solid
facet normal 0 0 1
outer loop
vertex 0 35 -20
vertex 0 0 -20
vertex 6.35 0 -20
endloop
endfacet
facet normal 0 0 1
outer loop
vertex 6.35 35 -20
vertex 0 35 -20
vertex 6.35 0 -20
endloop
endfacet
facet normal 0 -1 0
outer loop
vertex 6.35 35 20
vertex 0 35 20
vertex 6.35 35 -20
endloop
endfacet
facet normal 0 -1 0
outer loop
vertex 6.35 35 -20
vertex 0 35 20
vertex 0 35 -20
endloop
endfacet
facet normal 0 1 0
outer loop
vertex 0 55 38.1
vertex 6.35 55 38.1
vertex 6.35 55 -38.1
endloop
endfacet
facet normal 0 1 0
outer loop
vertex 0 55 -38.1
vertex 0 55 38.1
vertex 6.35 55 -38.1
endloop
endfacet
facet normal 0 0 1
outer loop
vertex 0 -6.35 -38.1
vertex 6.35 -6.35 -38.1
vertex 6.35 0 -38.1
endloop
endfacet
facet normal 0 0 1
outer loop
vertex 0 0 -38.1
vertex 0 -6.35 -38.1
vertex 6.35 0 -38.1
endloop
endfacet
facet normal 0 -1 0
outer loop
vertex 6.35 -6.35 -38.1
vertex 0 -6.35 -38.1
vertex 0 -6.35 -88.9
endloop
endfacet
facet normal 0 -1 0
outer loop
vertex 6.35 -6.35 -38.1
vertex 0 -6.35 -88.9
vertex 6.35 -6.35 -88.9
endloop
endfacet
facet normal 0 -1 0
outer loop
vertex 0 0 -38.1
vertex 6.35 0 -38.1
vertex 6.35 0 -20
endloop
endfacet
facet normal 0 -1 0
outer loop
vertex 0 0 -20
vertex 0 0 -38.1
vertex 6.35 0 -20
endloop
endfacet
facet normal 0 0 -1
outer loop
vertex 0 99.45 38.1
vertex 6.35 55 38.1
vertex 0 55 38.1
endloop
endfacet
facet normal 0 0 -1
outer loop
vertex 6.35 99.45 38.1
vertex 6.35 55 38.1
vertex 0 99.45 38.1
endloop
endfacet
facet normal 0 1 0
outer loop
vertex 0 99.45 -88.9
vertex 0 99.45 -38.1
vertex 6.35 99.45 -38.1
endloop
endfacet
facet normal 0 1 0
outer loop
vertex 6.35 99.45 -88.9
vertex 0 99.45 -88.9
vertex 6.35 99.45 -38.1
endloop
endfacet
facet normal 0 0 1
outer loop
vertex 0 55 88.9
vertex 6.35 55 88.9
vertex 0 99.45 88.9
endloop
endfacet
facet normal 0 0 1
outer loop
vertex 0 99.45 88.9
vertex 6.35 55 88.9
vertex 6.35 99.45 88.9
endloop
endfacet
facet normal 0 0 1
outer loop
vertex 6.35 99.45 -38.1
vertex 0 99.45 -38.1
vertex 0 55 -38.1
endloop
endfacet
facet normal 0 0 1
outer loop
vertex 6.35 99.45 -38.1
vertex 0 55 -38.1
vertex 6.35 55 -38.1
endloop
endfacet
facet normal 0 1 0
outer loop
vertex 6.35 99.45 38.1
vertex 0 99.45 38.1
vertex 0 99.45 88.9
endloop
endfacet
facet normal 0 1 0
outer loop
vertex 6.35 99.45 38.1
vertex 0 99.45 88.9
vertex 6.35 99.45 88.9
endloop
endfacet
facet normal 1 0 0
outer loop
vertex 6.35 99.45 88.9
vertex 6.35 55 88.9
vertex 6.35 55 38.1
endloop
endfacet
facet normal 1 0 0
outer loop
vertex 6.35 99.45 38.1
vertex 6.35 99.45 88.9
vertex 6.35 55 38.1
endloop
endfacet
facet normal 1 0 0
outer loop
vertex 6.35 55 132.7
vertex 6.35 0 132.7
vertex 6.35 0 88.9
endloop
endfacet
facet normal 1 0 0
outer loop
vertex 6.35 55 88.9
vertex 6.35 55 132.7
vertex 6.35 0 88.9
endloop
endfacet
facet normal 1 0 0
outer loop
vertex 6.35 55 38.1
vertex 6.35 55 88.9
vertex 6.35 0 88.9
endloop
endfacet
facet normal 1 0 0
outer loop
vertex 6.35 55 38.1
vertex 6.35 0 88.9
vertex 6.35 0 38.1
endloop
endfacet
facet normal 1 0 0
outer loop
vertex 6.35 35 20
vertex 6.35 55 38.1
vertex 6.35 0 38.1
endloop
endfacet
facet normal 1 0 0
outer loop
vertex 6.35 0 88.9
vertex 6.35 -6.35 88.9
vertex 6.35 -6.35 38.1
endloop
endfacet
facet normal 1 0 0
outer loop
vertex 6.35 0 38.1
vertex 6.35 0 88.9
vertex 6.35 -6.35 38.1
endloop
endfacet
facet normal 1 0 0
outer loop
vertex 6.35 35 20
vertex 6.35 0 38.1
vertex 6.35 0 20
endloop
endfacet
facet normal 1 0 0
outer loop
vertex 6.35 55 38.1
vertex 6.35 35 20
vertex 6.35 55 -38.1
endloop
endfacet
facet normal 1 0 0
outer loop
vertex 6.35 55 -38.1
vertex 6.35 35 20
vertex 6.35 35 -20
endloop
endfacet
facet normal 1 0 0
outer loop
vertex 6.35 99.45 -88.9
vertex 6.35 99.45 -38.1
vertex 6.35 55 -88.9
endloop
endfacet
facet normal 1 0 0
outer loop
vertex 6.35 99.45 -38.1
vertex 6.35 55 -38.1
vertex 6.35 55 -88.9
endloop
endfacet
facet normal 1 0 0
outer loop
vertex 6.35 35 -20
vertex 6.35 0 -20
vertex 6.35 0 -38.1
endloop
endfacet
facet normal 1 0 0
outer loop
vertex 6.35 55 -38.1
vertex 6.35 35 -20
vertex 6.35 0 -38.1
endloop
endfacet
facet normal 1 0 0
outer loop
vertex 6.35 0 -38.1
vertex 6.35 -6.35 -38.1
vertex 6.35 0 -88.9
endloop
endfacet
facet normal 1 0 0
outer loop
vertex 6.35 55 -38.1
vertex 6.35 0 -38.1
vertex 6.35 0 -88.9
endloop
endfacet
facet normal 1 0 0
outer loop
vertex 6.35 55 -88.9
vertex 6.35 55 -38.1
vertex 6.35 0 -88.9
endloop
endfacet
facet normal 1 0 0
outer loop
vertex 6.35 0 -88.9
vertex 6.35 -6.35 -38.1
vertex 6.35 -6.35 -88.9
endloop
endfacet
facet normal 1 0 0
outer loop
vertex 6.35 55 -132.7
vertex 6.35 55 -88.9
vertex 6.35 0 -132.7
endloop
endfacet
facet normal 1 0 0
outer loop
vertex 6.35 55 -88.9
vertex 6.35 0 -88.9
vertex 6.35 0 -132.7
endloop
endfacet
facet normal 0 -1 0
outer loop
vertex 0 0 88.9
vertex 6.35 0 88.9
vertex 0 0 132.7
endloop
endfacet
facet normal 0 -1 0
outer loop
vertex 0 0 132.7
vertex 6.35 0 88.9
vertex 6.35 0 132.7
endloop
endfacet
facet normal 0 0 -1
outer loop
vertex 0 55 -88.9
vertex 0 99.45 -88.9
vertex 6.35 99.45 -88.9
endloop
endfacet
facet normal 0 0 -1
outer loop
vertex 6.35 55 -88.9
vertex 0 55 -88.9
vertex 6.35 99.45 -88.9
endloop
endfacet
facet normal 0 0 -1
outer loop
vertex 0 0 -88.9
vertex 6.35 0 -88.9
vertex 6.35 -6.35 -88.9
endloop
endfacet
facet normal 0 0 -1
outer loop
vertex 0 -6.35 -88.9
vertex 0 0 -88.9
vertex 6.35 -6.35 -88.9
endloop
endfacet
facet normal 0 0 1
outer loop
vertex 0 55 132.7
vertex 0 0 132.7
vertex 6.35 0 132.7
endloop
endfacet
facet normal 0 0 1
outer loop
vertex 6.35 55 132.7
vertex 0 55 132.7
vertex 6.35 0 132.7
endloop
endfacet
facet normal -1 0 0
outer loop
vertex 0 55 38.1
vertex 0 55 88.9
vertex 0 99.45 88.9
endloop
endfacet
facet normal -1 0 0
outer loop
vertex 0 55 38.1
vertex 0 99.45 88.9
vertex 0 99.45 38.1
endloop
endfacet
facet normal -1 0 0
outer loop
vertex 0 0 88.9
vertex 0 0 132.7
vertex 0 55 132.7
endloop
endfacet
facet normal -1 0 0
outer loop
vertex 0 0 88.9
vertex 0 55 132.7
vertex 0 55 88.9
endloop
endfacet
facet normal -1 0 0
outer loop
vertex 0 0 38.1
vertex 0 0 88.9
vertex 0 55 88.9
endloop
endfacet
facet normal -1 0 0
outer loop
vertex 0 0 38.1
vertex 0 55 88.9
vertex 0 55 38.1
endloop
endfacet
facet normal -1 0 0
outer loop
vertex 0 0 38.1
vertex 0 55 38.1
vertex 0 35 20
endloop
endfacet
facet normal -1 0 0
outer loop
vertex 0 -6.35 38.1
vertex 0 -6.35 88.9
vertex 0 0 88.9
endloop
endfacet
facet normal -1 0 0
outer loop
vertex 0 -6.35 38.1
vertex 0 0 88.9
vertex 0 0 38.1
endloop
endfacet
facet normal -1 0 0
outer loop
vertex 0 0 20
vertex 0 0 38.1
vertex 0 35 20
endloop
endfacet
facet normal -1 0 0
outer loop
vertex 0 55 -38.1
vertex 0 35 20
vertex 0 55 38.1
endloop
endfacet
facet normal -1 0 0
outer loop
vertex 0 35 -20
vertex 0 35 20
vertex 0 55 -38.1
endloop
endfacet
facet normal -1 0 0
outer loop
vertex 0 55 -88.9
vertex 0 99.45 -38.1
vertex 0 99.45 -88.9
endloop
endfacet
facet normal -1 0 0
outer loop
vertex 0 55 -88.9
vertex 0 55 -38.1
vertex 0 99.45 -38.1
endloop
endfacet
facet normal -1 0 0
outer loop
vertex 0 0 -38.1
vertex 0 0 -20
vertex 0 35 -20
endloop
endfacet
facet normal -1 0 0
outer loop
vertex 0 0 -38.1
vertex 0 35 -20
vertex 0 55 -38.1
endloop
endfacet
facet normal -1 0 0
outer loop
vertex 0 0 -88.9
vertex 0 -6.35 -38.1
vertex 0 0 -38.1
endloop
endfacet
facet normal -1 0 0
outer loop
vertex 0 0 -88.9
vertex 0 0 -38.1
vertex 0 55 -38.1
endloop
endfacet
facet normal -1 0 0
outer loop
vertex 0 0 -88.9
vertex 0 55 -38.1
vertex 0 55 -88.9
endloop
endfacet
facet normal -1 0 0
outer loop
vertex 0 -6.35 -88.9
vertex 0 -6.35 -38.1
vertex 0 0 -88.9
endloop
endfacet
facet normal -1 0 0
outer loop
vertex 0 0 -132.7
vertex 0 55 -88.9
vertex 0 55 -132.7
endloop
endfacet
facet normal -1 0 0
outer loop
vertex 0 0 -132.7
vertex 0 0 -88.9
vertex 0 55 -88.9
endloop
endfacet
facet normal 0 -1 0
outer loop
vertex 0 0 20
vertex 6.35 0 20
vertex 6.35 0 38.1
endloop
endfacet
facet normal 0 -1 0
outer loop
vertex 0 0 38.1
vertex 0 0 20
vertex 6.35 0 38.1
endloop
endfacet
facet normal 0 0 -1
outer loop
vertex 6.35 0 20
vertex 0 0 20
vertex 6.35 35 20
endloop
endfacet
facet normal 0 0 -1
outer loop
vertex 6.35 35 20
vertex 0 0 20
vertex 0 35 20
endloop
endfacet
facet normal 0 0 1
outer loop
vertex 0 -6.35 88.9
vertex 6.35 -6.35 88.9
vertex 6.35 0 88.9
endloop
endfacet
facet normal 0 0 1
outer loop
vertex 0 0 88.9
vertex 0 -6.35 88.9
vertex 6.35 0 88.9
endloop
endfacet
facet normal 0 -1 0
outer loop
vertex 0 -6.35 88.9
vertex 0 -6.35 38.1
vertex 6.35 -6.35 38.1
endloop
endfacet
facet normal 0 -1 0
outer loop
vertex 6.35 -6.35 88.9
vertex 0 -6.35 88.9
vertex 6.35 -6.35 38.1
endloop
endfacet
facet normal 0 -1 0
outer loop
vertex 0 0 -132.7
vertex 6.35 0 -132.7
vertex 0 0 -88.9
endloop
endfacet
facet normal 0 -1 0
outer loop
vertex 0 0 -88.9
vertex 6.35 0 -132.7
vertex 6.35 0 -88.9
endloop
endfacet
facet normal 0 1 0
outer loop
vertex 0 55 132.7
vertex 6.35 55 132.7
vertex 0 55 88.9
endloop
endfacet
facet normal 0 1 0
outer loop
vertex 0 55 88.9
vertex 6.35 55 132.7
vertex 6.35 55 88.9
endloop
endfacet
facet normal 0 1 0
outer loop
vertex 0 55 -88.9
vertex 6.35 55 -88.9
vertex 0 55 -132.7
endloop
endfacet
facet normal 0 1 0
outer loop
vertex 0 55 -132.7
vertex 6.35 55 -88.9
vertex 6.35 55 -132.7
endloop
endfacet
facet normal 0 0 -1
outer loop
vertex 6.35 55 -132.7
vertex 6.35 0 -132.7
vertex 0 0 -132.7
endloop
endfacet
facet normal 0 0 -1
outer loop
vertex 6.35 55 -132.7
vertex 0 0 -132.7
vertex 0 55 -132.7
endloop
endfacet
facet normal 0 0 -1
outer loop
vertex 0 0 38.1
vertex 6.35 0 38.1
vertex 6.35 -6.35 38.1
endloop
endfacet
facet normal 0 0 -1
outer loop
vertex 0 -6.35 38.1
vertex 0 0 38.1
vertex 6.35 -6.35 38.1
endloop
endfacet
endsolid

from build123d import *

# Parameters (mm, degrees)
BOSS_EXTRUDE1_DEPTH = 6.35
SKETCH4_W           = 6.35
SKETCH4_H           = 237.700000096
SKETCH4_H_2         = 112.7
BOSS_EXTRUDE2_DEPTH = 6.35
SKETCH5_W           = 6.35
SKETCH5_H           = 390.400000096
BOSS_EXTRUDE3_DEPTH = 6.35
SKETCH6_W           = 125.000000096
SKETCH6_H           = 67.700000012
CUT_EXTRUDE1_DEPTH  = 265.978178443
SKETCH7_W           = 76.2
SKETCH7_H           = 6.35
CUT_EXTRUDE2_DEPTH  = 147.333301068
SKETCH8_W           = 6.35
SKETCH8_H           = 50.8
BOSS_EXTRUDE4_DEPTH = 38.1


with BuildPart() as part:
    # Sketch3 → Boss-Extrude1 (new body)
    with BuildSketch(Plane(origin=(0, 0, 0), x_dir=(0, 0, -1), z_dir=(1, 0, 0))):
        Polygon((-132.7, 55.000000012), (-132.7, 0), (-20, 0), (-20, 35), (20, 35), (20, 0), (257.700000096, 0), (257.700000096, 55.000000012), align=None)
    extrude(amount=BOSS_EXTRUDE1_DEPTH)

    # Sketch4 → Boss-Extrude2 (add)
    with BuildSketch(Plane.XZ):
        with Locations((3.175, -138.850000048)):
            Rectangle(SKETCH4_W, SKETCH4_H)
        with Locations((3.175, 76.35)):
            Rectangle(SKETCH4_W, SKETCH4_H_2)
    extrude(amount=BOSS_EXTRUDE2_DEPTH)

    # Sketch5 → Boss-Extrude3 (add)
    with BuildSketch(Plane(origin=(0, 55.000000012, 0), x_dir=(1, 0, 0), z_dir=(0, 1, 0))):
        with Locations((3.175, 62.500000048)):
            Rectangle(SKETCH5_W, SKETCH5_H)
    extrude(amount=BOSS_EXTRUDE3_DEPTH)

    # Sketch6 → Cut-Extrude1 (cut, through all)
    with BuildSketch(Plane(origin=(6.35, 0, 0), x_dir=(0, 0, -1), z_dir=(1, 0, 0))):
        with Locations((195.200000048, 27.500000006)):
            Rectangle(SKETCH6_W, SKETCH6_H)
    extrude(amount=-CUT_EXTRUDE1_DEPTH, mode=Mode.SUBTRACT)

    # Sketch7 → Cut-Extrude2 (cut, through all)
    with BuildSketch(Plane(origin=(6.35, 0, 0), x_dir=(0, 0, -1), z_dir=(1, 0, 0))):
        Polygon((-88.9, 0), (-126.35, 0), (-132.7, 0), (-132.7, -6.35), (-88.9, -6.35), align=None)
        Polygon((-26.35, 0), (-38.1, 0), (-38.1, -6.35), (-20, -6.35), (-20, 0), align=None)
        Polygon((26.35, 0), (20, 0), (20, -6.35), (38.1, -6.35), (38.1, 0), align=None)
        Polygon((132.7, 0), (126.35, 0), (88.9, 0), (88.9, -6.35), (132.7, -6.35), align=None)
        Polygon((88.9, 61.350000012), (88.9, 55.000000012), (126.35, 55.000000012), (132.7, 55.000000012), (132.7, 61.350000012), align=None)
        with Locations((0, 58.175000012)):
            Rectangle(SKETCH7_W, SKETCH7_H)
        Polygon((-132.7, 55.000000012), (-126.35, 55.000000012), (-88.9, 55.000000012), (-88.9, 61.350000012), (-132.7, 61.350000012), align=None)
    extrude(amount=-CUT_EXTRUDE2_DEPTH, mode=Mode.SUBTRACT)

    # Sketch8 → Boss-Extrude4 (add)
    with BuildSketch(Plane(origin=(0, 61.350000012, 0), x_dir=(1, 0, 0), z_dir=(0, 1, 0))):
        with Locations((3.175, 63.5)):
            Rectangle(SKETCH8_W, SKETCH8_H)
        with Locations((3.175, -63.5)):
            Rectangle(SKETCH8_W, SKETCH8_H)
    extrude(amount=BOSS_EXTRUDE4_DEPTH)


solid = part.part
